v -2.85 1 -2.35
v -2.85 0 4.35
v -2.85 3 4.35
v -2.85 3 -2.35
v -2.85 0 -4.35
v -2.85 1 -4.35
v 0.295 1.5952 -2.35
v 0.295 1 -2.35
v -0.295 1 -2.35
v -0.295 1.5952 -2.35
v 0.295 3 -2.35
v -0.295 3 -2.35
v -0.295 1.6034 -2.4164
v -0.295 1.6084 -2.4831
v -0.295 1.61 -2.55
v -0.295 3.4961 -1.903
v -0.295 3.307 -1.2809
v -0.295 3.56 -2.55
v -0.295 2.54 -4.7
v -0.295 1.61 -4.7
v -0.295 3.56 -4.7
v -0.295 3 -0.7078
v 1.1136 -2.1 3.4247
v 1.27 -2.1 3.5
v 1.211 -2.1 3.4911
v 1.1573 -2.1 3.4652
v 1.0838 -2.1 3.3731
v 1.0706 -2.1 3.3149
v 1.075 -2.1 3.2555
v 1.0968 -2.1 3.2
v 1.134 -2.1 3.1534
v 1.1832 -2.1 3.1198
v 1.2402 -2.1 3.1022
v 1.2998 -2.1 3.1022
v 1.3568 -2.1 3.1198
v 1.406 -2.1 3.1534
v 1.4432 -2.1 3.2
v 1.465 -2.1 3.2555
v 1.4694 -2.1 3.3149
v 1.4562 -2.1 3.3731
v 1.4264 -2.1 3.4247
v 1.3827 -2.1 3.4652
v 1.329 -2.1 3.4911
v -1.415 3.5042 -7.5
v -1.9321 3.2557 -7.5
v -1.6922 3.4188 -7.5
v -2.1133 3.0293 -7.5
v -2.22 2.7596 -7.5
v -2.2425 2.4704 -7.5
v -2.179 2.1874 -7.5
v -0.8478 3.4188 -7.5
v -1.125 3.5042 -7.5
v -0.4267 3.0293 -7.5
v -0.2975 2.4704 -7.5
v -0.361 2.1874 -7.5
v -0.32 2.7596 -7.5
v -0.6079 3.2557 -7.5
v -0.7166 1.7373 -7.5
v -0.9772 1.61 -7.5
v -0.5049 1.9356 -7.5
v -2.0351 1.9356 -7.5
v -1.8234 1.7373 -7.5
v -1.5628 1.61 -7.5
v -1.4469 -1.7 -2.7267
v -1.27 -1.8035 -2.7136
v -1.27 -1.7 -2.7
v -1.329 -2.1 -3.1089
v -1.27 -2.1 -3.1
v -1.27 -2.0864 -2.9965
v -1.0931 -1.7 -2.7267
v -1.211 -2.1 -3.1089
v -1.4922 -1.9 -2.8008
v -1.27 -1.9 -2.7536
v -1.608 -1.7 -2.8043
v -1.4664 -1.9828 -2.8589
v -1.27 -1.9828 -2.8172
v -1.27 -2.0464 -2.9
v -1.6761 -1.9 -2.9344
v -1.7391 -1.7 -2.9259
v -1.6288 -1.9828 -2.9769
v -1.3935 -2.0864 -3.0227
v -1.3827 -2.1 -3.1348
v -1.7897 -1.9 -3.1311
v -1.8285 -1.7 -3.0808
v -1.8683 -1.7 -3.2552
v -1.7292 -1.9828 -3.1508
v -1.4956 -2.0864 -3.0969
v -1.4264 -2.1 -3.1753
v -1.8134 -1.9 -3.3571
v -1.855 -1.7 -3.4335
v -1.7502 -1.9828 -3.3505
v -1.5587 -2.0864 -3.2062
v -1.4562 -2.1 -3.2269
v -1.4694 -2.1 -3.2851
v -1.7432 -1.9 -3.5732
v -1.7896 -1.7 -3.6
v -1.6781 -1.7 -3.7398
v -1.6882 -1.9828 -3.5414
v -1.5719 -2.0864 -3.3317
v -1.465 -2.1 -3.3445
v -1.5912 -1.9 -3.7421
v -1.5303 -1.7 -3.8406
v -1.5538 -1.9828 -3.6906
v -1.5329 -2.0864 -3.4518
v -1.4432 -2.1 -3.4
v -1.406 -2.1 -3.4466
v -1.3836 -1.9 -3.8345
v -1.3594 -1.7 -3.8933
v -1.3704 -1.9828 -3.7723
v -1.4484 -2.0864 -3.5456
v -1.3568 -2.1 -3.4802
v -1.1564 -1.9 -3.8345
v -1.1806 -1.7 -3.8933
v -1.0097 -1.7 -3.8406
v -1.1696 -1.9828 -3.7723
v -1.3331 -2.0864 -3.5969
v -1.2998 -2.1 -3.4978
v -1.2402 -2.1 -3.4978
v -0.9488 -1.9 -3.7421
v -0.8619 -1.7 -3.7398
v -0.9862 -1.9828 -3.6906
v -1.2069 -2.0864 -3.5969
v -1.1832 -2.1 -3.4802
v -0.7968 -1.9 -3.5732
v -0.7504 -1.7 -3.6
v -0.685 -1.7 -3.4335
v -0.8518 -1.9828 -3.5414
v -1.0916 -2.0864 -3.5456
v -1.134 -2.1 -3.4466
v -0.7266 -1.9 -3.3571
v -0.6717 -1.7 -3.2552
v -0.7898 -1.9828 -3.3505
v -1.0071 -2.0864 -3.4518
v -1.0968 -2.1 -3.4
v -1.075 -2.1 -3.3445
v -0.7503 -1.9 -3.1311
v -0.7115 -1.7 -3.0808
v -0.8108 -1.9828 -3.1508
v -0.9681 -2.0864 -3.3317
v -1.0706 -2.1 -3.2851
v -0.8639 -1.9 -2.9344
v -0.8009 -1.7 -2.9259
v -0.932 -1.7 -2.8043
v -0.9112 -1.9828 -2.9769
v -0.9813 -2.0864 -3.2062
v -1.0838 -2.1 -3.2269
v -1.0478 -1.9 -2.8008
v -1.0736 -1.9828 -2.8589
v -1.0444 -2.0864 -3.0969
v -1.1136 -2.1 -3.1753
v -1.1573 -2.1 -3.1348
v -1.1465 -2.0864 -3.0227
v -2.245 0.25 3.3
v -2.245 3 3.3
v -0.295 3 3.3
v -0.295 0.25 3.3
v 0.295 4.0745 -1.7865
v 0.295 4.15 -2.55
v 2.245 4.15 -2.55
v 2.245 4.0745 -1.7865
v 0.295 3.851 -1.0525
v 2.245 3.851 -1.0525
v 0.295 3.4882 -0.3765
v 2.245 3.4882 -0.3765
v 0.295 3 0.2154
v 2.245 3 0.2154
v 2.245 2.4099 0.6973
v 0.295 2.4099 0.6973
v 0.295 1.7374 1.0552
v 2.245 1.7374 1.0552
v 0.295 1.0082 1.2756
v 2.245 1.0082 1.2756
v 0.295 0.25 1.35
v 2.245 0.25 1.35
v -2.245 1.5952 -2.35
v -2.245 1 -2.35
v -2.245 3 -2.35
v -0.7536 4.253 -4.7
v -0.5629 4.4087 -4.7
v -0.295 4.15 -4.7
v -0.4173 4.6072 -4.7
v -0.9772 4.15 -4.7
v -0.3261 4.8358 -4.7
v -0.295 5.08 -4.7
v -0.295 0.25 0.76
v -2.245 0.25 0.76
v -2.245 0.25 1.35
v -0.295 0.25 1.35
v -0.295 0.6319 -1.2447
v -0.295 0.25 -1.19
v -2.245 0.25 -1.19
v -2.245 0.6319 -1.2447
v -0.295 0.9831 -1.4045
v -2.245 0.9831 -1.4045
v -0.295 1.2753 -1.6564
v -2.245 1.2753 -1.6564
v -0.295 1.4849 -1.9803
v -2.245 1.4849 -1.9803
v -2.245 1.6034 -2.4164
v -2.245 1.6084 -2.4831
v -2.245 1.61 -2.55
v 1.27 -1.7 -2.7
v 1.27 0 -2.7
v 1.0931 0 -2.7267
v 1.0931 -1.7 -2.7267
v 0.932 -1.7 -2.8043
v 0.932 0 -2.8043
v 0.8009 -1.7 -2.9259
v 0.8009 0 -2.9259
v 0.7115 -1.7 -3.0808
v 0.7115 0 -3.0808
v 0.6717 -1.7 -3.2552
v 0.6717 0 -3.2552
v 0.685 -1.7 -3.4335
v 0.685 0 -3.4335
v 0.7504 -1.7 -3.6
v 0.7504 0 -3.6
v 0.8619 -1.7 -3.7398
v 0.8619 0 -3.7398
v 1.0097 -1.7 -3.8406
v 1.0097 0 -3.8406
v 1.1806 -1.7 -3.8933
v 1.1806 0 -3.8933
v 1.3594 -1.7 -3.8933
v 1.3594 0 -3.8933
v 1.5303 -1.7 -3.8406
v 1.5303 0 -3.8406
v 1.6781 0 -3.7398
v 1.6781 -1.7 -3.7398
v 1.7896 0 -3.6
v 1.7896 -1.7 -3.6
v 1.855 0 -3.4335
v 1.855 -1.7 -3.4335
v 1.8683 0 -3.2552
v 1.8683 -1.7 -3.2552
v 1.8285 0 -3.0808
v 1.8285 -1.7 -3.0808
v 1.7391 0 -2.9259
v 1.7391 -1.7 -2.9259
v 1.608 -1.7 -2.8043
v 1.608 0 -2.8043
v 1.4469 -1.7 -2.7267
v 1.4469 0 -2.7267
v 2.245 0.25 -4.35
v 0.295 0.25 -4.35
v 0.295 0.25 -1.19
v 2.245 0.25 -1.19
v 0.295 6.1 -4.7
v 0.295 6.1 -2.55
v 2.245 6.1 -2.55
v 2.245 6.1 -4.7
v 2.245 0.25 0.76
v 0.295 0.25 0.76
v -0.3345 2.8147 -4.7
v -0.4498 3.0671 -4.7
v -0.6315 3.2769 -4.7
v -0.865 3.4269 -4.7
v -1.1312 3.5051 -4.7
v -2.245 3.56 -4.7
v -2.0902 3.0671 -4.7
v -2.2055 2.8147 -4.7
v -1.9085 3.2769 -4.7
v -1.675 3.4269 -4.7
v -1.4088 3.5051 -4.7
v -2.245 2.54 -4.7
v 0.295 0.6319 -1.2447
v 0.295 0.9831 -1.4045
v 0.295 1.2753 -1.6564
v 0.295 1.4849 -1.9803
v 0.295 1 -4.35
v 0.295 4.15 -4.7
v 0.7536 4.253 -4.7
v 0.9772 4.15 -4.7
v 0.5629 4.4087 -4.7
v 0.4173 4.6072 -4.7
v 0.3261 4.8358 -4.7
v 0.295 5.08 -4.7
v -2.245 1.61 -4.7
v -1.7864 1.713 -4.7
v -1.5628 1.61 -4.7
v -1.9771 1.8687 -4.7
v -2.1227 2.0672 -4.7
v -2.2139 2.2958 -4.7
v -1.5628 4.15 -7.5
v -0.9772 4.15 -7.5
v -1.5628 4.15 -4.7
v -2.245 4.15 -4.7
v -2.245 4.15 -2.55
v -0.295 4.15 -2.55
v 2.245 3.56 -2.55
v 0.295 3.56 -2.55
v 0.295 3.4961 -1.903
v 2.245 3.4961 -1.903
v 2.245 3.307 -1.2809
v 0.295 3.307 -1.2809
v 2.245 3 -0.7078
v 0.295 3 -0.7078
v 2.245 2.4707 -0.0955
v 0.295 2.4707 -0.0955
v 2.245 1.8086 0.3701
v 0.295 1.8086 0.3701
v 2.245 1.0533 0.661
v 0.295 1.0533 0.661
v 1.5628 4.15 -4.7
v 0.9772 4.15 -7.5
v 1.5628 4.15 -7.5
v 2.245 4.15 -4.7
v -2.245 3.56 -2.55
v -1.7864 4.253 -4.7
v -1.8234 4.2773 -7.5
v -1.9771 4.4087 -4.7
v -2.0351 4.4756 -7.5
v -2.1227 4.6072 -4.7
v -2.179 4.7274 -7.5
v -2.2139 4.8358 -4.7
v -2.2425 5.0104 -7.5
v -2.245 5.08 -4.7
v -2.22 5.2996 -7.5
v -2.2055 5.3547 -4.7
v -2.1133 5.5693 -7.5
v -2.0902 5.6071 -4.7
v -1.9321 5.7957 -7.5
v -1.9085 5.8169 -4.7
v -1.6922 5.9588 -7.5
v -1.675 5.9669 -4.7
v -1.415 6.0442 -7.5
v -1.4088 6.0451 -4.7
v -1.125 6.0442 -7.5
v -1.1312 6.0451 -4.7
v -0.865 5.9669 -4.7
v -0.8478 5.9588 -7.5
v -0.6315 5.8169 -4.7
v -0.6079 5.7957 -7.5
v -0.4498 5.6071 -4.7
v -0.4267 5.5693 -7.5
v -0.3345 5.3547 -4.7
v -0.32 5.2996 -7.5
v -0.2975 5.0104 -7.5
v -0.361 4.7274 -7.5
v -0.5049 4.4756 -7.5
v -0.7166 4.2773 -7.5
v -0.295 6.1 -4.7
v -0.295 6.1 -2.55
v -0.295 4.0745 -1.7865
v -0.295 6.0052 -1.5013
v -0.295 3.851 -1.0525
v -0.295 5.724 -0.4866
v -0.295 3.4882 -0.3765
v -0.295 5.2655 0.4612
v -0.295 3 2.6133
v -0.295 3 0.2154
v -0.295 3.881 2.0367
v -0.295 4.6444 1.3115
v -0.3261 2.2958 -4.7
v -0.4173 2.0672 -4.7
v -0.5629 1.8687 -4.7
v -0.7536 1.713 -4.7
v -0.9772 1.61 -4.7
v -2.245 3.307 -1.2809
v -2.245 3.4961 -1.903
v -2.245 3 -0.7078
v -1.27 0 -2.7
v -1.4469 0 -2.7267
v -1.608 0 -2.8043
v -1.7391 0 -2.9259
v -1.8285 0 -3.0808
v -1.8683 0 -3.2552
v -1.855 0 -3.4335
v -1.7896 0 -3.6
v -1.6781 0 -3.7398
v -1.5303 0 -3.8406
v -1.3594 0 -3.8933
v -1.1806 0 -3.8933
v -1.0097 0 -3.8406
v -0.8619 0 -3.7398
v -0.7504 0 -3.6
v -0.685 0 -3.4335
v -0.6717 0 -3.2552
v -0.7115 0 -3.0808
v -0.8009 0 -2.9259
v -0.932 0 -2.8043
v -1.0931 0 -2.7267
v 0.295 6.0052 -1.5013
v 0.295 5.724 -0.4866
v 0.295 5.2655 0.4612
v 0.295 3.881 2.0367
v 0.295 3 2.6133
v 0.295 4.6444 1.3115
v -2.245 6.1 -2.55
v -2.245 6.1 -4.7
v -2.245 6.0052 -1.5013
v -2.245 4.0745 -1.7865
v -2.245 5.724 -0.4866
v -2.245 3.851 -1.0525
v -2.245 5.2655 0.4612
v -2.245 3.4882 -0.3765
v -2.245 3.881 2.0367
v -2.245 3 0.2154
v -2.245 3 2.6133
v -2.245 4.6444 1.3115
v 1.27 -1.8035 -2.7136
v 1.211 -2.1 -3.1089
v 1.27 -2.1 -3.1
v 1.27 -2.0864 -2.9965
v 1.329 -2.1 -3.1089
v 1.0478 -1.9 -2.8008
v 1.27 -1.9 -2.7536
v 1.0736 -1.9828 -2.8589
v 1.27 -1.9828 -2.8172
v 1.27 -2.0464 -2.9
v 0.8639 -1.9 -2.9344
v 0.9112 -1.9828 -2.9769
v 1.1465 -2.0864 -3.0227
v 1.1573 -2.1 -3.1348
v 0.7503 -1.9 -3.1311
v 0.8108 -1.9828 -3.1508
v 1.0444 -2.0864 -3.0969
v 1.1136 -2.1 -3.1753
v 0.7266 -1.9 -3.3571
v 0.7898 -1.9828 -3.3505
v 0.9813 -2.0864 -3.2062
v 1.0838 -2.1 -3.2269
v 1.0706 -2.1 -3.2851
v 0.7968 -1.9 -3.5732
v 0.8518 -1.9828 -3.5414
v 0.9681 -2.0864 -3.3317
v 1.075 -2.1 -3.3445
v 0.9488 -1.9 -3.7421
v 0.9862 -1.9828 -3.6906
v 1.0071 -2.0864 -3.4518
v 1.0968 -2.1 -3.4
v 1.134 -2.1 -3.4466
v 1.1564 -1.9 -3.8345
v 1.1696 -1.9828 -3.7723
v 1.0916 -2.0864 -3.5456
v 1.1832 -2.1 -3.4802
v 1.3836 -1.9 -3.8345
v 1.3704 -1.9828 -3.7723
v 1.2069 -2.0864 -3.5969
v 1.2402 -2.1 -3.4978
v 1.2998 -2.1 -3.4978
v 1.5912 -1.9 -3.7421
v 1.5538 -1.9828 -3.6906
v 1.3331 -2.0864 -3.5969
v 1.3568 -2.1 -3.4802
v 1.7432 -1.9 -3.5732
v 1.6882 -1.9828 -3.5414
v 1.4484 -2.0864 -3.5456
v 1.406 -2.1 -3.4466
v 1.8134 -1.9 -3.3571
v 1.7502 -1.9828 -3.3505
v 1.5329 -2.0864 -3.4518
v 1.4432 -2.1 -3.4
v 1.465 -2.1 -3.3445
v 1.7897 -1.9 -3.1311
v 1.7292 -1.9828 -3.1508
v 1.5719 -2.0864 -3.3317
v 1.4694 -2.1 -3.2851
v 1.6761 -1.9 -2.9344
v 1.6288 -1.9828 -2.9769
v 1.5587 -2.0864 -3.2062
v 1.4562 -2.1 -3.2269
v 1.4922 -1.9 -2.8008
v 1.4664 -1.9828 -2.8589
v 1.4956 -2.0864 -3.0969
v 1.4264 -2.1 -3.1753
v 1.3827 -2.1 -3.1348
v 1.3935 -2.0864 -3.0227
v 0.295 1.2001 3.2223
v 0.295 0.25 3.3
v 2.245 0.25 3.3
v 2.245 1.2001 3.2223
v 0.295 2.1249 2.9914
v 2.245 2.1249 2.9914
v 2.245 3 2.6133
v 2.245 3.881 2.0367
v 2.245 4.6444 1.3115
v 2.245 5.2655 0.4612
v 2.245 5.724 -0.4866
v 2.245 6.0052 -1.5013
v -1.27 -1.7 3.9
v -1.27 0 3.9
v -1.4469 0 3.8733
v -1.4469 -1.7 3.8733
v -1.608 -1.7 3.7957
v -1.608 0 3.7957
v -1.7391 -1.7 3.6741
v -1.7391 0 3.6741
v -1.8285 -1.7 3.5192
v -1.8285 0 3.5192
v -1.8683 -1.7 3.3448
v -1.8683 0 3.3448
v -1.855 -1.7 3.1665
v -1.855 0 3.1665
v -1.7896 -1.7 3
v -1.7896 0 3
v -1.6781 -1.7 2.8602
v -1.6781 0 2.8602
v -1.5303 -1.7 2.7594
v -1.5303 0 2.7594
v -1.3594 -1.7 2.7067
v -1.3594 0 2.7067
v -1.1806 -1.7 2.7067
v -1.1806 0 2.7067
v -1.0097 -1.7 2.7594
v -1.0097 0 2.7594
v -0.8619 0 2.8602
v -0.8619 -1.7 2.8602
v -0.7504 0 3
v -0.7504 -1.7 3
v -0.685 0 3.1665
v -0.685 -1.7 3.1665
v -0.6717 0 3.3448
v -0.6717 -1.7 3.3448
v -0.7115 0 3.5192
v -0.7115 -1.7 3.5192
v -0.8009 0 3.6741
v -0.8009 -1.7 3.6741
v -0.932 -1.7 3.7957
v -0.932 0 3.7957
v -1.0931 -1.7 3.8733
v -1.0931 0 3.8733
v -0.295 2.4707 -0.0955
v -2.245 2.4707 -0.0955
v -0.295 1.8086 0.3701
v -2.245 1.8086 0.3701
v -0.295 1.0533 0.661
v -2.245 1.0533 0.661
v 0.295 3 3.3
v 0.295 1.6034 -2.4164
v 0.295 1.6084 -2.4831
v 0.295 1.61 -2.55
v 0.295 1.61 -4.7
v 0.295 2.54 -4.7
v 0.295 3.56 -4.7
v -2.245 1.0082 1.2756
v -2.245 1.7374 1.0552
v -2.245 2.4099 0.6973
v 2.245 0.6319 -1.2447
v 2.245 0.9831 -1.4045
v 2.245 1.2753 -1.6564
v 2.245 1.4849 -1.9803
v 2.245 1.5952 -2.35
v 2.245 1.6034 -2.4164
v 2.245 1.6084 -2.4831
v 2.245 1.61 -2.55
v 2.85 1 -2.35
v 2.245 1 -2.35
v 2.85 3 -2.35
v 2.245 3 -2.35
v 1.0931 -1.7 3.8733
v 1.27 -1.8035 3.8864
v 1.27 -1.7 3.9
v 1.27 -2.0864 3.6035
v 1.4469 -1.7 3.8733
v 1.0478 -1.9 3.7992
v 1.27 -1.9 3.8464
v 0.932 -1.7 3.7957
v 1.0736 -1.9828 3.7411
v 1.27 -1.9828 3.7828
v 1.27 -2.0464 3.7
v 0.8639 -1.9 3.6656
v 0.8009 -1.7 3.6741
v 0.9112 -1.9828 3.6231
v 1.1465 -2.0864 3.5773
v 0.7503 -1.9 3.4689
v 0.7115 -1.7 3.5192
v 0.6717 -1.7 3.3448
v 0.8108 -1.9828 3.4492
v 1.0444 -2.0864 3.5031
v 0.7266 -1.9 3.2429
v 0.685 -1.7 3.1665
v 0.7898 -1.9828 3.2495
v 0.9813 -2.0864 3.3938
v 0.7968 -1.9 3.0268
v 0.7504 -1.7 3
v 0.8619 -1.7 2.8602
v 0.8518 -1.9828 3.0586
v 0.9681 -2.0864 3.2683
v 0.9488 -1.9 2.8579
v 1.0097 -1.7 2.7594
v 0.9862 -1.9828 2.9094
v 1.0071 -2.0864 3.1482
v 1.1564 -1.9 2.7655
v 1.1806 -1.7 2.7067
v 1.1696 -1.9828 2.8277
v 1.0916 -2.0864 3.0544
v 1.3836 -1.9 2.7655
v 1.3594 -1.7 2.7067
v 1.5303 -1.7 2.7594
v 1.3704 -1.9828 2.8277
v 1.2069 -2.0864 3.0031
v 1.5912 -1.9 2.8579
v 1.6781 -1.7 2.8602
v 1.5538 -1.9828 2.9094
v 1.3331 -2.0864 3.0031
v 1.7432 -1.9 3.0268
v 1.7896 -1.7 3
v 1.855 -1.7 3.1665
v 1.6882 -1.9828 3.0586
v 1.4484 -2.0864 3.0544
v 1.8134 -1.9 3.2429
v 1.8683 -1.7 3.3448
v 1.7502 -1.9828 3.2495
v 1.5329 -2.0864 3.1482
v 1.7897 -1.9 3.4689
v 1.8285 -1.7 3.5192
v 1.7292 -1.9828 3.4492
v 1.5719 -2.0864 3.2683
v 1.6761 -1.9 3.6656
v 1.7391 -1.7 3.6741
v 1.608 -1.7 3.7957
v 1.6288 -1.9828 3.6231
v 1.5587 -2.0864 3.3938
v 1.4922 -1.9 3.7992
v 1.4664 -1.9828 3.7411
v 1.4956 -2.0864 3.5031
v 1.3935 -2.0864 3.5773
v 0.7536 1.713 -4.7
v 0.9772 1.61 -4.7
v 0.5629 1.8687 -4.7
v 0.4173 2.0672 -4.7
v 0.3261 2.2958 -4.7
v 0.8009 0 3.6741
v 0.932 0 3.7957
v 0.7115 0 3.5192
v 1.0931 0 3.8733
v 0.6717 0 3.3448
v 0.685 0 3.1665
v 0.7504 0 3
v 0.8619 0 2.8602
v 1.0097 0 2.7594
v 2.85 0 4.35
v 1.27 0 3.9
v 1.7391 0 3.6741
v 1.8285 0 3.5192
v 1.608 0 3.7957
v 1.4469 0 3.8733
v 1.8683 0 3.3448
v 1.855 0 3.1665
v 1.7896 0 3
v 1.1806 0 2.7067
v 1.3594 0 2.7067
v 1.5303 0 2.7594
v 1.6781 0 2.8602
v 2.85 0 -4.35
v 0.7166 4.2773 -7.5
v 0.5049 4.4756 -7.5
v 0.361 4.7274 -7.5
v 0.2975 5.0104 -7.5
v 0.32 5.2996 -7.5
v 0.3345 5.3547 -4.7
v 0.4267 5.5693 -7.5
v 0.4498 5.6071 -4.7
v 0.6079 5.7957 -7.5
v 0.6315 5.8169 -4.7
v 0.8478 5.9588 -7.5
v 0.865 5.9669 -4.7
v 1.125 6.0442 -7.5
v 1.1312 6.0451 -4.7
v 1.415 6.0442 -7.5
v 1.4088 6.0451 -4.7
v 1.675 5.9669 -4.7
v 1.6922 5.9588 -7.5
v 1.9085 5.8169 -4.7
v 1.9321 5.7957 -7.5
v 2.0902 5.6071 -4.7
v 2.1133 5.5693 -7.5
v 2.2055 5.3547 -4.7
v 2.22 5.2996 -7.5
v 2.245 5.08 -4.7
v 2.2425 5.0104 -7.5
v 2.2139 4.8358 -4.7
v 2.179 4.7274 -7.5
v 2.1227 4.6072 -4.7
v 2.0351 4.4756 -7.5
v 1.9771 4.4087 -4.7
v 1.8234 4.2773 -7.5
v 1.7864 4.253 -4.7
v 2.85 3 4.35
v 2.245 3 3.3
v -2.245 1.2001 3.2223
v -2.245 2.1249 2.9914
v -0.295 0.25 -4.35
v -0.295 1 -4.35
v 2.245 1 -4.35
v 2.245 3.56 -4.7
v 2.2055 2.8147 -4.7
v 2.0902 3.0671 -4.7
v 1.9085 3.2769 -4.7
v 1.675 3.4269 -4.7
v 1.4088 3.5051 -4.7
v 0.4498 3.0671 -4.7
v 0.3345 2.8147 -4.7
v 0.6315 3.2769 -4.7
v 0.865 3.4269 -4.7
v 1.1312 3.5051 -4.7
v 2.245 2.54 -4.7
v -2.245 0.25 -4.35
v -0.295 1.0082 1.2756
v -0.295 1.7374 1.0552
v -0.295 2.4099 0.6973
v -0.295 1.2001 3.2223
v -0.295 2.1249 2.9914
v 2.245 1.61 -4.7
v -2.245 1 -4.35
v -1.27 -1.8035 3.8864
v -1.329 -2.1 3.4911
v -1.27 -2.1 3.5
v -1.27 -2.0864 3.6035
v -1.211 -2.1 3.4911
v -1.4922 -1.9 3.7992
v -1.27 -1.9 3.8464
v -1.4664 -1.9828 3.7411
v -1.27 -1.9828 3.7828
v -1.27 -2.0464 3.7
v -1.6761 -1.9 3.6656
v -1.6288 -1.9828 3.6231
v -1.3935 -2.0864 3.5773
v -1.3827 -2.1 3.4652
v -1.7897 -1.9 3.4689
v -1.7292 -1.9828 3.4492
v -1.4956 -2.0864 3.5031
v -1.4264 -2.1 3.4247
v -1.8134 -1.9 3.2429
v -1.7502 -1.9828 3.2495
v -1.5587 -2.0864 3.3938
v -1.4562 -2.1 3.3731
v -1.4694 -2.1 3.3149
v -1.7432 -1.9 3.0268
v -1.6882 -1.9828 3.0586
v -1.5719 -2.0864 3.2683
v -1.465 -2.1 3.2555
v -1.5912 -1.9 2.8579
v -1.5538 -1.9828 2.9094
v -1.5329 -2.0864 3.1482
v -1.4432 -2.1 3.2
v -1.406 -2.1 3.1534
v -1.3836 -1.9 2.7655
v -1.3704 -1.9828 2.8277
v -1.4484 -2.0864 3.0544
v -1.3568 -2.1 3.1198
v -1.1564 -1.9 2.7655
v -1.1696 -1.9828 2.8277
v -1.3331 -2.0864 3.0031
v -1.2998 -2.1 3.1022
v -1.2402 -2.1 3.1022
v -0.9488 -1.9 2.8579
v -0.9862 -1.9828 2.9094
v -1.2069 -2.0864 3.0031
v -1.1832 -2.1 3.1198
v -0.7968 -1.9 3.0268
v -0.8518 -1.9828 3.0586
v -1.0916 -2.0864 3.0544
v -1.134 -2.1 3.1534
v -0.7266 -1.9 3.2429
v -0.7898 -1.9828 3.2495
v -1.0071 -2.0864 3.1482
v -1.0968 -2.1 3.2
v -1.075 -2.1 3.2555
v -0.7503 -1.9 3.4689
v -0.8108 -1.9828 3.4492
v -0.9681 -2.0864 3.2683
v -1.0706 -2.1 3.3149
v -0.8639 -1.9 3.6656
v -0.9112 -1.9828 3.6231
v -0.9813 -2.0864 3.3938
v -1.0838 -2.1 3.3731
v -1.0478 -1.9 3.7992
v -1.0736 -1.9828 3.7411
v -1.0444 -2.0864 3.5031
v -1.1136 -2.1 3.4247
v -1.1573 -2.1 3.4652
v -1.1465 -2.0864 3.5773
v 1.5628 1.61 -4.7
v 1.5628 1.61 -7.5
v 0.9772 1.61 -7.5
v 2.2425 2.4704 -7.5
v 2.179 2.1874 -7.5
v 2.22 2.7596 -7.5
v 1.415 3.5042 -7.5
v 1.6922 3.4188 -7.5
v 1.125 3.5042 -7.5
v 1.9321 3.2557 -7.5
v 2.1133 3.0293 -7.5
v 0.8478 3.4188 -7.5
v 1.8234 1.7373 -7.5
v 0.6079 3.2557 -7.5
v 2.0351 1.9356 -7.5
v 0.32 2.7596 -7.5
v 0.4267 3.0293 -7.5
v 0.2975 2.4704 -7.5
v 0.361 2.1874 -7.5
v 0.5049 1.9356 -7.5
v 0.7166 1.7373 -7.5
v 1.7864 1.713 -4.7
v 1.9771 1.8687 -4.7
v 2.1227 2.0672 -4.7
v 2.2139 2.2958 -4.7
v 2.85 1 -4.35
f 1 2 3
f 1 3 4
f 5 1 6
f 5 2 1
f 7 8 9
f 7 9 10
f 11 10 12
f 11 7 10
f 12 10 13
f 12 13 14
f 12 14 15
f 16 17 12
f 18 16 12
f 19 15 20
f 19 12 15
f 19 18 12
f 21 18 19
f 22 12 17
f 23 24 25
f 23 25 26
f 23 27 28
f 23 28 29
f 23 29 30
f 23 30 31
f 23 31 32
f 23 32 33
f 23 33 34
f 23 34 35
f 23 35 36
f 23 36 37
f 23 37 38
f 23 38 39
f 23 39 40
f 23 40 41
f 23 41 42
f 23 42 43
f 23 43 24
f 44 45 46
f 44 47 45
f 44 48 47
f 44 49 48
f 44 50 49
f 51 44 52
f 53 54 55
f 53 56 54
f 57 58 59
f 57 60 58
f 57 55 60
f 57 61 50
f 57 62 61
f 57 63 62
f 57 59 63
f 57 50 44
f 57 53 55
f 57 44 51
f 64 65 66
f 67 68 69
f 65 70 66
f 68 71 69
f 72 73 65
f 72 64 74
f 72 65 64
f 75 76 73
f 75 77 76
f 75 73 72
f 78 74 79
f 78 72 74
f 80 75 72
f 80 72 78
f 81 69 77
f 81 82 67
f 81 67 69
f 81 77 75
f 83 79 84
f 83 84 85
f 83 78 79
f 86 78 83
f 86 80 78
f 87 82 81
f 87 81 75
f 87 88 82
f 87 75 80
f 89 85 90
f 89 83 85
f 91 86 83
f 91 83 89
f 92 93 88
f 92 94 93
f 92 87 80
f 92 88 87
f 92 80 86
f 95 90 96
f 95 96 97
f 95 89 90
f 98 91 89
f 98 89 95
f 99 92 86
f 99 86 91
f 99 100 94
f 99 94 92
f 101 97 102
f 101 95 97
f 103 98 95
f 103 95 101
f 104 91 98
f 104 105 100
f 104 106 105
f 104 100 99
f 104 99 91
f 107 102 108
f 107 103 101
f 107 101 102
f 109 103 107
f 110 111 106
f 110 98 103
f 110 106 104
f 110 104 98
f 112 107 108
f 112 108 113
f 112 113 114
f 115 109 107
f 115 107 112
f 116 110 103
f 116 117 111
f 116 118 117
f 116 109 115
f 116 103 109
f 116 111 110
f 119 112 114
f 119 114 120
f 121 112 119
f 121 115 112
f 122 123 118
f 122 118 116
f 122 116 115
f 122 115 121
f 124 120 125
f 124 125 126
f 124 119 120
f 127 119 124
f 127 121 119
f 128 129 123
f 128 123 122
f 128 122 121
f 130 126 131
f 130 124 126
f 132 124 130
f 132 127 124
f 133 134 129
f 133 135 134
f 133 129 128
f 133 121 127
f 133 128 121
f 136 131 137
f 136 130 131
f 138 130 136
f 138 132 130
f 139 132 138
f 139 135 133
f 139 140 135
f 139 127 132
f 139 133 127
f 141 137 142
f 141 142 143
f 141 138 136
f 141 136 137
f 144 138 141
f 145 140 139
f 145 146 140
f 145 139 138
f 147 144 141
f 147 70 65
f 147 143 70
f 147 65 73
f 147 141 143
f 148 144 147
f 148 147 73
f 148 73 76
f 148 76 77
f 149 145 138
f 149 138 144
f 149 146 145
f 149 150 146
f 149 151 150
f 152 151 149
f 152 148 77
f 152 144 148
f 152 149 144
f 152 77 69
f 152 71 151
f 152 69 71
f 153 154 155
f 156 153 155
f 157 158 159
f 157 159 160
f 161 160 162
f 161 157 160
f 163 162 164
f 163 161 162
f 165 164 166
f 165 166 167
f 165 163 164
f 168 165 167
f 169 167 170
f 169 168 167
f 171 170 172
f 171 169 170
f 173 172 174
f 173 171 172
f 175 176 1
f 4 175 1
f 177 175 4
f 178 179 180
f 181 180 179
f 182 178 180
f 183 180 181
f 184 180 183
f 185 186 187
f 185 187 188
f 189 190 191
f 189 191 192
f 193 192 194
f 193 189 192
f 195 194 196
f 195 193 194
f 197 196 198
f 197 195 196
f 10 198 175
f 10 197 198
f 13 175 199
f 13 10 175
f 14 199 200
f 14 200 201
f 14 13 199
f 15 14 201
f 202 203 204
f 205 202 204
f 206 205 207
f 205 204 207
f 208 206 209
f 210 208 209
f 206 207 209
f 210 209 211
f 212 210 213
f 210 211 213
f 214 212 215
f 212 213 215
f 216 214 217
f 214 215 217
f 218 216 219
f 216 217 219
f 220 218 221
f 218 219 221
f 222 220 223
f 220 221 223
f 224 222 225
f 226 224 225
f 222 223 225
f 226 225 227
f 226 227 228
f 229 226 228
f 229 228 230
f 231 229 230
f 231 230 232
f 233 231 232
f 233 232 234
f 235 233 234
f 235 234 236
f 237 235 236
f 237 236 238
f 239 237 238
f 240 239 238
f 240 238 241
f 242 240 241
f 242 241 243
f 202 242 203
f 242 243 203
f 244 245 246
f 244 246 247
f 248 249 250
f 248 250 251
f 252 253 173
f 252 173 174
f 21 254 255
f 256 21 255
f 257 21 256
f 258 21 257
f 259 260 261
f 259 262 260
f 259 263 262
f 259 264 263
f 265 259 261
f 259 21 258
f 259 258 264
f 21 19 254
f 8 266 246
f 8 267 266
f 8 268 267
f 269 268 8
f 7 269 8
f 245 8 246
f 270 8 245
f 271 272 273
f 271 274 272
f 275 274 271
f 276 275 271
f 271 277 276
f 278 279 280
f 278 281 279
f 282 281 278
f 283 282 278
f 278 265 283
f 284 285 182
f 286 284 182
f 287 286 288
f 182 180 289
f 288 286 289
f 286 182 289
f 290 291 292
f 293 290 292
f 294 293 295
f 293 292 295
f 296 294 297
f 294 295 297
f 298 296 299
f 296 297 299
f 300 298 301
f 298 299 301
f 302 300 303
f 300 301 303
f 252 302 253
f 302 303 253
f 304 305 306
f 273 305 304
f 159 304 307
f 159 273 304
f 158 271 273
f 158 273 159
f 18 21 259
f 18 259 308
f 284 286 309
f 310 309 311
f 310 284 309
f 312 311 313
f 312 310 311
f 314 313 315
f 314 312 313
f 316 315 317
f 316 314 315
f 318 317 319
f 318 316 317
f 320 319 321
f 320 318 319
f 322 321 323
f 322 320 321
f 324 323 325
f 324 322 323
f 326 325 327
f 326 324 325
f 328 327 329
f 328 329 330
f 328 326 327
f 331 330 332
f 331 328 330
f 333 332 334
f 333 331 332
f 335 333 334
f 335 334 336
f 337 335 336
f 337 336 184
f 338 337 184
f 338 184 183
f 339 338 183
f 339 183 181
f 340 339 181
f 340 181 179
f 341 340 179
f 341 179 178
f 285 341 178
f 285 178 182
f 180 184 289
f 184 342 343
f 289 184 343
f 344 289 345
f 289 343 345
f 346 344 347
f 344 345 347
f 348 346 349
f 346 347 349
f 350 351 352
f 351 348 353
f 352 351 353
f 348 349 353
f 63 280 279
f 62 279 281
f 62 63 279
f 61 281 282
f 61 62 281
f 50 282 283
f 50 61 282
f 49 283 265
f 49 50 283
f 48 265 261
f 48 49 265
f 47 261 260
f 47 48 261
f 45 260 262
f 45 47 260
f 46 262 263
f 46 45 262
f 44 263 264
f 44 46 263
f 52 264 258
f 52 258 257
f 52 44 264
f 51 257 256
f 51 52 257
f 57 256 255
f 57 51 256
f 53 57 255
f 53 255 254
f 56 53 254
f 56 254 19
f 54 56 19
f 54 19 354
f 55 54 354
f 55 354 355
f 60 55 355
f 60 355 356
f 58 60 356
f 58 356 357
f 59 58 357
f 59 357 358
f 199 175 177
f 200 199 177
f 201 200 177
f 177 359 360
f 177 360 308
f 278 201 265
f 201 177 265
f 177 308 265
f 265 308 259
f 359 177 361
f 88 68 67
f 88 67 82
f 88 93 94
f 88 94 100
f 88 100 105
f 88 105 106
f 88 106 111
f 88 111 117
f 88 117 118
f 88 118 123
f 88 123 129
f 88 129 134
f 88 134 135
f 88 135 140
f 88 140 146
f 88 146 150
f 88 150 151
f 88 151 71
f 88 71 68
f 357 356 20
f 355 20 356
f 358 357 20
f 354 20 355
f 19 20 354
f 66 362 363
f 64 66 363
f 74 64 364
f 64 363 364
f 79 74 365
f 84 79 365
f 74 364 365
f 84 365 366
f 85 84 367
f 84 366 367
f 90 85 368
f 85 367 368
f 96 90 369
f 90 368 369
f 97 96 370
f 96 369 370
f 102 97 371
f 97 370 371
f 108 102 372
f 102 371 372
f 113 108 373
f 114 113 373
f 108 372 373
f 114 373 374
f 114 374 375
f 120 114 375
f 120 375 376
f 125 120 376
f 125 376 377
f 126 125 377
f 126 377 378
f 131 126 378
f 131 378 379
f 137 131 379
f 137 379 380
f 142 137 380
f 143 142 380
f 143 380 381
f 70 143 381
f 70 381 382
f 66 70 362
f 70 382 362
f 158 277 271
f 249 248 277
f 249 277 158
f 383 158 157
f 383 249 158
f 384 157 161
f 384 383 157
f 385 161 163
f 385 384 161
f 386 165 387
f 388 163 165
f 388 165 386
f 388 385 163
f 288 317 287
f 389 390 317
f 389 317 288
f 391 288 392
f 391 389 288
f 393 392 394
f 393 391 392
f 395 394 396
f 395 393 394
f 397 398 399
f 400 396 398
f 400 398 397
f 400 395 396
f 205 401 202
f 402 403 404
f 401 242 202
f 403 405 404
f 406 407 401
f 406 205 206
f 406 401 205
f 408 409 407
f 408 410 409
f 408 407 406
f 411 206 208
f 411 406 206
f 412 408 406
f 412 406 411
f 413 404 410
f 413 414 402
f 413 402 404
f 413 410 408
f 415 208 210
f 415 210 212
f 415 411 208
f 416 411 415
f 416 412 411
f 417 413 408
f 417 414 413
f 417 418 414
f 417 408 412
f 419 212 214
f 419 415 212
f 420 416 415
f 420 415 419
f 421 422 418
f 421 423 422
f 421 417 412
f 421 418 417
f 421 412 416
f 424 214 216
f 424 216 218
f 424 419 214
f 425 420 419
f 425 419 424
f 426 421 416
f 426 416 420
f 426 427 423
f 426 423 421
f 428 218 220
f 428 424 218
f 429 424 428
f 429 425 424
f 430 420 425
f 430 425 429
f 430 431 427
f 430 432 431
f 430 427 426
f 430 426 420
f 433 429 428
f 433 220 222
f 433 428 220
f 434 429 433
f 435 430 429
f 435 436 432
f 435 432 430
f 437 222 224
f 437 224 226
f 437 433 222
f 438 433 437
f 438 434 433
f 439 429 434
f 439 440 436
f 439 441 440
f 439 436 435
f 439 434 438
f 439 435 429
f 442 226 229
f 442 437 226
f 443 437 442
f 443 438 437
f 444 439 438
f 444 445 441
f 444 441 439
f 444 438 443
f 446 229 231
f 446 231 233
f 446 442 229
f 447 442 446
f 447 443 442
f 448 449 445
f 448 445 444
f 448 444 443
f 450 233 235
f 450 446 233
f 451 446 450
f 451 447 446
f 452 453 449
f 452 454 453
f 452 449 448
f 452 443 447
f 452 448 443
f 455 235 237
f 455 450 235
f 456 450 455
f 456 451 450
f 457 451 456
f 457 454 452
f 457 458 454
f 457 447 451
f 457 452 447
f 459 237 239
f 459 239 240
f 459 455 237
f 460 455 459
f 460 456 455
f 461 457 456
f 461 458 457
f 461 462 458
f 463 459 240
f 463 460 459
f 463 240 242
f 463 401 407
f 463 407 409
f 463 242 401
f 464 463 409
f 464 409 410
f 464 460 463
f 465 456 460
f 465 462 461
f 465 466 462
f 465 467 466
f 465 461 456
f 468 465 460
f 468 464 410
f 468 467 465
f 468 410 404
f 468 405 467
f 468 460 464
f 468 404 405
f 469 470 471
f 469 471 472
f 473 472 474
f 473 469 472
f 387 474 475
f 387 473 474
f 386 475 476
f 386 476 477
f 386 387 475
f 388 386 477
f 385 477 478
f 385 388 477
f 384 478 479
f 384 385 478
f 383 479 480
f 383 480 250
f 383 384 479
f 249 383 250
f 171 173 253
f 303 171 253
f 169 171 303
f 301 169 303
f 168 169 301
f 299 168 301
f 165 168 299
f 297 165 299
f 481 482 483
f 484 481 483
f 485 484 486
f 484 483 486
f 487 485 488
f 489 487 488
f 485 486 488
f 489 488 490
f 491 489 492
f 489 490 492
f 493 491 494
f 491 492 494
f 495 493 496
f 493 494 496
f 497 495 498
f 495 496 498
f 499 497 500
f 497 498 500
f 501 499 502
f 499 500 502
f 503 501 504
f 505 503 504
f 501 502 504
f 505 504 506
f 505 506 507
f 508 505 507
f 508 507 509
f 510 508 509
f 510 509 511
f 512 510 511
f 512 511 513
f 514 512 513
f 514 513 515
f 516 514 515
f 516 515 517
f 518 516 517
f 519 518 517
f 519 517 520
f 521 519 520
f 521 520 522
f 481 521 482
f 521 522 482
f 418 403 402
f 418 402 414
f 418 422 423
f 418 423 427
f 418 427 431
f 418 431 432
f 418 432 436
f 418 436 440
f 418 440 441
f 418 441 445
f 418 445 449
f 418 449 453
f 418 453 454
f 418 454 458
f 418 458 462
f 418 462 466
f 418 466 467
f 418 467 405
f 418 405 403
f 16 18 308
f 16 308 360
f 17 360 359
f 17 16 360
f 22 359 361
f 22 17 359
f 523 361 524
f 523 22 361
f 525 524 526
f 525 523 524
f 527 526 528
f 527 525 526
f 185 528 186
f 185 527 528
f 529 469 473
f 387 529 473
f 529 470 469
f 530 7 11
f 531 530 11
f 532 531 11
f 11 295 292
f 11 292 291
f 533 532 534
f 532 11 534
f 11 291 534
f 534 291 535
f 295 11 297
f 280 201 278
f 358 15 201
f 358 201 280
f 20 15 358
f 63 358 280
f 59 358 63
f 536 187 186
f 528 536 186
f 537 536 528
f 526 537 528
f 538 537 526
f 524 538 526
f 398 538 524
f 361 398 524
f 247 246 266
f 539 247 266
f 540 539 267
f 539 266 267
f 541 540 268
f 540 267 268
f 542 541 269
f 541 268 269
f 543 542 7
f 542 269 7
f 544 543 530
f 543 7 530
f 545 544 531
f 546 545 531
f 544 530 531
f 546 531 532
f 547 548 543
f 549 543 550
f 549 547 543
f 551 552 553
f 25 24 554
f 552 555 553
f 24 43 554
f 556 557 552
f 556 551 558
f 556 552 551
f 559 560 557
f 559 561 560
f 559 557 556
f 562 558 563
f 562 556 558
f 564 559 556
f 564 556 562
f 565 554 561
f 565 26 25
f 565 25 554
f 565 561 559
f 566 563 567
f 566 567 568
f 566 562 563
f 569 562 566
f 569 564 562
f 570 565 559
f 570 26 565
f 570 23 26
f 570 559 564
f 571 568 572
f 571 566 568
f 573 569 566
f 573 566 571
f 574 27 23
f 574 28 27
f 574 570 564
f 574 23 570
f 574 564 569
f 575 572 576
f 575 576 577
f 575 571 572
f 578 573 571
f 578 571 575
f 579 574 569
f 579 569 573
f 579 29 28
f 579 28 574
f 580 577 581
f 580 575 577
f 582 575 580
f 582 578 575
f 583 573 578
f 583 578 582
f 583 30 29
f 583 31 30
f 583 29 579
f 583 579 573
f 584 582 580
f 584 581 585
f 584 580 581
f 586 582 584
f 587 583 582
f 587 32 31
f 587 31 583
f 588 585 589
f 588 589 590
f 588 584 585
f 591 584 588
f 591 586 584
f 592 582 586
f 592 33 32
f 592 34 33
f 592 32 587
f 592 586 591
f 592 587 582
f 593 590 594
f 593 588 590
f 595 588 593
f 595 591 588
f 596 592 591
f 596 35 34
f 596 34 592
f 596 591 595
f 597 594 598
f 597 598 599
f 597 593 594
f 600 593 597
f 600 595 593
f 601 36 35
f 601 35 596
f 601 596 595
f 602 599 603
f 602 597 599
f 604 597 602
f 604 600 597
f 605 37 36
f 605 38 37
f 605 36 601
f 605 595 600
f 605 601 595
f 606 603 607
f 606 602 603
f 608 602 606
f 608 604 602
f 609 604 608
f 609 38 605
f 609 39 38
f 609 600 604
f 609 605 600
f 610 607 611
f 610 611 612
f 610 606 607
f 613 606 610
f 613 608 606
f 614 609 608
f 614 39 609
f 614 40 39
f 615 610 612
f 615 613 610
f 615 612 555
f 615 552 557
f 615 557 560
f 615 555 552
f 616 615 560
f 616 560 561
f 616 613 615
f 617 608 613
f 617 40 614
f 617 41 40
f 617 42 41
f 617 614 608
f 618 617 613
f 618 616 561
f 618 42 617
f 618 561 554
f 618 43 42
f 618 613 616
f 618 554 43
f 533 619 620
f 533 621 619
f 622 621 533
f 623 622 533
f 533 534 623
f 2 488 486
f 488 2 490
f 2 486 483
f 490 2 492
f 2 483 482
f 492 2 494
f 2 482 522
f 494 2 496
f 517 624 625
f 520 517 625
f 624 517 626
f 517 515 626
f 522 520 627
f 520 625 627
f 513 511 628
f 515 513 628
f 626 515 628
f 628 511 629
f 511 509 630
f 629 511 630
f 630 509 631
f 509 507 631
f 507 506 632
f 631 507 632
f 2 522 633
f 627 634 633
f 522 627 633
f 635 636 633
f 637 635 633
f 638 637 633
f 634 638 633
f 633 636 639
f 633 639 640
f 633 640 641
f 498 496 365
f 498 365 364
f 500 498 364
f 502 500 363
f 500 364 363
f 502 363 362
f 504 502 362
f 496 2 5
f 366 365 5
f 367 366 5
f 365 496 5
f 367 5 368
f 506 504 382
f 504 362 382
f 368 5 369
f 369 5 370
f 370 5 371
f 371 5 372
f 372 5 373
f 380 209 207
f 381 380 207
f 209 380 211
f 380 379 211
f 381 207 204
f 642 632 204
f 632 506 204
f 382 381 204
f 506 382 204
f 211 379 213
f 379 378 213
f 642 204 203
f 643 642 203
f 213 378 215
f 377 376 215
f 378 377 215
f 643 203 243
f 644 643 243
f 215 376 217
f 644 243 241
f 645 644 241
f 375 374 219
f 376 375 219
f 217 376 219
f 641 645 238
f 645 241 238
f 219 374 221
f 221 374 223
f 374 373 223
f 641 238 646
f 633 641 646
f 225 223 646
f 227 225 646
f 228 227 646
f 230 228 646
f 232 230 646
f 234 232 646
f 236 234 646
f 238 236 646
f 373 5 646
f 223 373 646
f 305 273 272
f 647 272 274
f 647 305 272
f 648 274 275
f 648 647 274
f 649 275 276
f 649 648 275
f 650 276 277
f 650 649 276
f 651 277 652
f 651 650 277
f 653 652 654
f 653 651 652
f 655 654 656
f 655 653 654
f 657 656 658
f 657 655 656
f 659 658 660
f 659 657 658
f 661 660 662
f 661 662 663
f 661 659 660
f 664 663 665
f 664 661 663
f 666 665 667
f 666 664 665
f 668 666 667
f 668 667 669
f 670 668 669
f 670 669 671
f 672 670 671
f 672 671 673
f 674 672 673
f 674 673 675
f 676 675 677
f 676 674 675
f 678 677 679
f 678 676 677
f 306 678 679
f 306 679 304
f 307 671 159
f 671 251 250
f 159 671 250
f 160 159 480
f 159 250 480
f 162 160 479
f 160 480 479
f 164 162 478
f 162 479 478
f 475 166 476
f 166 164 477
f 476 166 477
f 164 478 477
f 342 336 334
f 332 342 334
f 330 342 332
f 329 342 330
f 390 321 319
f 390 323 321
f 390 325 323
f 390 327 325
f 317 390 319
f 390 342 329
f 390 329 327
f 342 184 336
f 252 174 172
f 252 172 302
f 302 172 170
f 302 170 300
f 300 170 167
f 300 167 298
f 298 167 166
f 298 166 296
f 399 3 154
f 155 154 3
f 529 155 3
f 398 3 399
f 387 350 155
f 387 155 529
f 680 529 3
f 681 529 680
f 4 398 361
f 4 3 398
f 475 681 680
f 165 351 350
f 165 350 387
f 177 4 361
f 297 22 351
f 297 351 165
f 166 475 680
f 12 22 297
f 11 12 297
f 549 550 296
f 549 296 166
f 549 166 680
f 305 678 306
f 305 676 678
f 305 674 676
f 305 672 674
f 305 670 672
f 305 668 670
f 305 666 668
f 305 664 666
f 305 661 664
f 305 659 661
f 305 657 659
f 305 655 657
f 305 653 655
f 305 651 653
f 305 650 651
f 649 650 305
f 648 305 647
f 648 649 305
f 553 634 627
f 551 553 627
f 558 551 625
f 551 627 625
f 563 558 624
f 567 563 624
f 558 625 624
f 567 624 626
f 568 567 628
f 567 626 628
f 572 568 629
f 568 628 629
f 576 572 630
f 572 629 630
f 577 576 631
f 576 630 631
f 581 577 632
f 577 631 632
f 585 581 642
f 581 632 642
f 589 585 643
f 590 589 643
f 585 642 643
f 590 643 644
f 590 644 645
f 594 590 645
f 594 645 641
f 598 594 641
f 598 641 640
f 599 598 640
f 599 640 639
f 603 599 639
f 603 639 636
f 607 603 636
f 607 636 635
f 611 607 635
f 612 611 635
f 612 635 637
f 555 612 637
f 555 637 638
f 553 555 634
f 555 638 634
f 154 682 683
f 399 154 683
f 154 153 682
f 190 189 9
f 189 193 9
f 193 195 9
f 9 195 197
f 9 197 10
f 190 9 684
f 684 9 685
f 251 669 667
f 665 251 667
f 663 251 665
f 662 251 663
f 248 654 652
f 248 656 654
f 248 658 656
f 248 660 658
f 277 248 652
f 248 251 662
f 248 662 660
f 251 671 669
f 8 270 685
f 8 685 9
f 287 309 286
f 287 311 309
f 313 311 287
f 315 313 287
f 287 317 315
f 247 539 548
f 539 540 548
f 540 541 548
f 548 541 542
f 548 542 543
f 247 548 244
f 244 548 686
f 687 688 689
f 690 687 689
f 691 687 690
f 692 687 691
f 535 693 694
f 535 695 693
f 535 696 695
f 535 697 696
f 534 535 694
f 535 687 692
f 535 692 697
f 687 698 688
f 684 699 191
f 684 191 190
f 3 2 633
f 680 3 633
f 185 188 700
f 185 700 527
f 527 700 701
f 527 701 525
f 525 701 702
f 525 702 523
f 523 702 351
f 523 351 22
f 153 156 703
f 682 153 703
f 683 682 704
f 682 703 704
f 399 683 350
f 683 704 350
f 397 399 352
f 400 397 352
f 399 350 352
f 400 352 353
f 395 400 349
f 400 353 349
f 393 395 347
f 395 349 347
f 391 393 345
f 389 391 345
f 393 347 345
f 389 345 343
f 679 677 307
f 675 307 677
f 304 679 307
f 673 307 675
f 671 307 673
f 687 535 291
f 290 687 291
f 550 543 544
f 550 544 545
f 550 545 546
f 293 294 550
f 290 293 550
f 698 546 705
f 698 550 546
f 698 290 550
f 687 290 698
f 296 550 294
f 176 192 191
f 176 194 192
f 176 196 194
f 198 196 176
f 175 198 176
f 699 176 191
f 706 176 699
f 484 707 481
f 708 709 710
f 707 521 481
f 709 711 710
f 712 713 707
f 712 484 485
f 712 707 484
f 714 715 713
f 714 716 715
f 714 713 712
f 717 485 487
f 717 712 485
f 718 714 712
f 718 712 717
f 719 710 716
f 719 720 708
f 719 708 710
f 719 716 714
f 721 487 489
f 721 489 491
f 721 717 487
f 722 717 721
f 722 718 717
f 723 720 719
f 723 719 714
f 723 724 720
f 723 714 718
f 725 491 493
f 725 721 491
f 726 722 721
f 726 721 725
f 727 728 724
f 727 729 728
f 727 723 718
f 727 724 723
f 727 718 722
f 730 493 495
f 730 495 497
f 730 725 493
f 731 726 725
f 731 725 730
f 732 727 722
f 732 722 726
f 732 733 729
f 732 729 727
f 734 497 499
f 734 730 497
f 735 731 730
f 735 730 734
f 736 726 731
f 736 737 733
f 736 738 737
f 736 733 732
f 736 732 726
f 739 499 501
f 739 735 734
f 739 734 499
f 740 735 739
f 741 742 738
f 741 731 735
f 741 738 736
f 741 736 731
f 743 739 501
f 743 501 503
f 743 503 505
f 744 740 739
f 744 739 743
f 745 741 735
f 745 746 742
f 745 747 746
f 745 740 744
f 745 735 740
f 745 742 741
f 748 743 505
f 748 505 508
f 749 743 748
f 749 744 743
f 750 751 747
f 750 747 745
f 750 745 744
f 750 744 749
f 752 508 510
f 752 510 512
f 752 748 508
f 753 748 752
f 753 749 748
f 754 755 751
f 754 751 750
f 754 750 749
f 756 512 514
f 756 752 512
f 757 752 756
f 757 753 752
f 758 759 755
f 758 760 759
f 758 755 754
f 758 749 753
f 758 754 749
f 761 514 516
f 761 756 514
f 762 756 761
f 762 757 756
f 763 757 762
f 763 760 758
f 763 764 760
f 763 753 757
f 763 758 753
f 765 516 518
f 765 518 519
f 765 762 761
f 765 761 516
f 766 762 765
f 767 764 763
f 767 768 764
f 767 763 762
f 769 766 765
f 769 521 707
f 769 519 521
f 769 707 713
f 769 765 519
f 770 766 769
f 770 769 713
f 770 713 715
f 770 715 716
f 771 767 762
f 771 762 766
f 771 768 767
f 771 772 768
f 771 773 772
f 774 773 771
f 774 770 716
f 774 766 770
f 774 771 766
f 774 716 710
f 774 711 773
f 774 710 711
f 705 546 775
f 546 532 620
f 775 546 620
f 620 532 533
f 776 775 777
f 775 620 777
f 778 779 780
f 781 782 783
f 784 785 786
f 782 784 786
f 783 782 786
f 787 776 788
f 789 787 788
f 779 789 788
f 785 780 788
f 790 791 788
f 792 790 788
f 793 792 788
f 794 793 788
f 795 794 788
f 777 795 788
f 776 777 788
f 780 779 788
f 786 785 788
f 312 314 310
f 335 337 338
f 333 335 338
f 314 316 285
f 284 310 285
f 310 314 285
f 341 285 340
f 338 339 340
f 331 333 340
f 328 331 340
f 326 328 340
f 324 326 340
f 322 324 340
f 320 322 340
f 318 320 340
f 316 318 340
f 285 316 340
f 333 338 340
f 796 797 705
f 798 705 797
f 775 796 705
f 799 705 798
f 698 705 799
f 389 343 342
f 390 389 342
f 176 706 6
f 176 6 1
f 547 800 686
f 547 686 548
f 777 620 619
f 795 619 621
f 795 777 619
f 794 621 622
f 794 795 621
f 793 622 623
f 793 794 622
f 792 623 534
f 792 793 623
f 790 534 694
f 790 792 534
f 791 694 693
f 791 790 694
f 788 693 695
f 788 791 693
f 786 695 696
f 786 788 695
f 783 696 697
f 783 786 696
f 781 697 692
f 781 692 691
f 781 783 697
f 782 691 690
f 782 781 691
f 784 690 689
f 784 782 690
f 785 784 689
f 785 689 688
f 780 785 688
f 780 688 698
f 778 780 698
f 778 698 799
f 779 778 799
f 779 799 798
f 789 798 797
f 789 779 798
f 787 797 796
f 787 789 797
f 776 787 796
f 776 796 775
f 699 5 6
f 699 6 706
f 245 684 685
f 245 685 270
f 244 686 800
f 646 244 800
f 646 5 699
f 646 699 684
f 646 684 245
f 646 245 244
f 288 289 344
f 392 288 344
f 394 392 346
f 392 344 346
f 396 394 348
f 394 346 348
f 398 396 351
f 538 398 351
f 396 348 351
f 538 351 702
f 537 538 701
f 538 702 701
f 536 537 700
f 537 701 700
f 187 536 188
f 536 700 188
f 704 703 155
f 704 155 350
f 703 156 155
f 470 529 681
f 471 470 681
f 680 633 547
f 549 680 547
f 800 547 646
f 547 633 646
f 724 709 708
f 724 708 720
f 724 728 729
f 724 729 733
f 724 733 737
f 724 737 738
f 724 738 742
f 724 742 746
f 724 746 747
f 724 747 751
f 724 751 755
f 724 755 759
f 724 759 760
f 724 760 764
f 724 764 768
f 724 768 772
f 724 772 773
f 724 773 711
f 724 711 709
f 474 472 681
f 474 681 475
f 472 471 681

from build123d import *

# Parameters (mm, degrees)
SZKIC1_W                    = 5.7
SZKIC1_H                    = 8.7
DODANIE_WYCI_GNI_CIE1_DEPTH = 3
SZKIC5_W                    = 1.95
SZKIC5_H                    = 7.65
WYTNIJ_WYCI_GNI_CIE2_DEPTH  = 2.75
SZKIC3_W                    = 2
SZKIC3_H                    = 2
WYTNIJ_WYCI_GNI_CIE1_DEPTH  = 9.802840451
SZKIC6_R                    = 0.6
DODANIE_WYCI_GNI_CIE2_DEPTH = 2.1
ZAOKR_GLENIE1_R             = 0.4
DODANIE_WYCI_GNI_CIE3_DEPTH = 1.95
DODANIE_WYCI_GNI_CIE4_DEPTH = 1.95
SZKIC9_OUTSIDE_W            = 10.8
SZKIC9_OUTSIDE_H            = 13.3
SZKIC9_OUTSIDE_R            = 0.975
WYTNIJ_WYCI_GNI_CIE4_DEPTH  = 2.8


with BuildPart() as part:
    # Szkic1 → Dodanie-wyciągnięcie1 (new body)
    with BuildSketch(Plane(origin=(0, 0, 0), x_dir=(1, 0, 0), z_dir=(0, 1, 0))):
        Rectangle(SZKIC1_W, SZKIC1_H)
    extrude(amount=DODANIE_WYCI_GNI_CIE1_DEPTH)

    # Szkic5 → Wytnij-wyciągnięcie2 (cut)
    with BuildSketch(Plane(origin=(0, 3, 0), x_dir=(1, 0, 0), z_dir=(0, 1, 0))):
        with Locations((1.27, 0.525)):
            Rectangle(SZKIC5_W, SZKIC5_H)
        with Locations((-1.27, 0.525)):
            Rectangle(SZKIC5_W, SZKIC5_H)
    extrude(amount=-WYTNIJ_WYCI_GNI_CIE2_DEPTH, mode=Mode.SUBTRACT)

    # Szkic3 → Wytnij-wyciągnięcie1 (cut, through all)
    with BuildSketch(Plane(origin=(2.85, 0, 1.65), x_dir=(0, 0, 1), z_dir=(-1, 0, 0))):
        with Locations((-5, 2)):
            Rectangle(SZKIC3_W, SZKIC3_H)
    extrude(amount=WYTNIJ_WYCI_GNI_CIE1_DEPTH, mode=Mode.SUBTRACT)

    # Szkic6 → Dodanie-wyciągnięcie2 (add)
    with BuildSketch(Plane.XZ):
        with Locations(Location((1.27, 3.3, 0), (0, 0, 90))):
            Circle(SZKIC6_R)
        with Locations(Location((-1.27, 3.3, 0), (0, 0, 90))):
            Circle(SZKIC6_R)
        with Locations(Location((1.27, -3.3, 0), (0, 0, 90))):
            Circle(SZKIC6_R)
        with Locations(Location((-1.27, -3.3, 0), (0, 0, 90))):
            Circle(SZKIC6_R)
    extrude(amount=DODANIE_WYCI_GNI_CIE2_DEPTH)

    # Zaokrąglenie1
    zaokr_glenie1_edges = [part.edges().sort_by_distance(p)[0] for p in [
        (1.27, -2.1, 2.7),
        (-1.27, -2.1, 2.7),
        (1.27, -2.1, -3.9),
        (-1.27, -2.1, -3.9),
    ]]
    fillet(zaokr_glenie1_edges, radius=ZAOKR_GLENIE1_R)

    # Szkic7 → Dodanie-wyciągnięcie3 (add)
    with BuildSketch(Plane(origin=(0.295, 0, 0), x_dir=(0, 0, -1), z_dir=(1, 0, 0))):
        with BuildLine():
            Line((2.55, 6.1), (7.5, 6.1))
            Line((7.5, 6.1), (7.5, 4.15))
            Line((7.5, 4.15), (2.55, 4.15))
            ThreePointArc((2.55, 4.15), (-0.207716447, 3.007716447), (-1.35, 0.25))
            Line((-1.35, 0.25), (-3.3, 0.25))
            ThreePointArc((-3.3, 0.25), (-1.58657467, 4.38657467), (2.55, 6.1))
        make_face()
    dodanie_wyci_gni_cie3 = extrude(amount=DODANIE_WYCI_GNI_CIE3_DEPTH)

    # Szkic8 → Dodanie-wyciągnięcie4 (add)
    with BuildSketch(Plane(origin=(0.295, 0, 0), x_dir=(0, 0, -1), z_dir=(1, 0, 0))):
        with BuildLine():
            Line((7.5, 3.56), (2.55, 3.56))
            ThreePointArc((2.55, 3.56), (0.209476554, 2.590523446), (-0.76, 0.25))
            Line((-0.76, 0.25), (1.19, 0.25))
            ThreePointArc((1.19, 0.25), (1.588334778, 1.211665222), (2.55, 1.61))
            Line((2.55, 1.61), (7.5, 1.61))
            Line((7.5, 1.61), (7.5, 3.56))
        make_face()
    dodanie_wyci_gni_cie4 = extrude(amount=DODANIE_WYCI_GNI_CIE4_DEPTH)

    # Lustro2: Dodanie-wyciągnięcie3, Dodanie-wyciągnięcie4 across plane
    add(dodanie_wyci_gni_cie3.mirror(Plane.ZY))
    add(dodanie_wyci_gni_cie4.mirror(Plane.ZY))

    # Szkic9 outside → Wytnij-wyciągnięcie4 (cut)
    with BuildSketch(Plane(origin=(0, 0, -7.5), x_dir=(-1, 0, 0), z_dir=(0, 0, -1))):
        with Locations((0, 2)):
            Rectangle(SZKIC9_OUTSIDE_W, SZKIC9_OUTSIDE_H)
        with Locations((-1.27, 2.54)):
            Circle(SZKIC9_OUTSIDE_R, mode=Mode.SUBTRACT)
        with Locations((-1.27, 5.08)):
            Circle(SZKIC9_OUTSIDE_R, mode=Mode.SUBTRACT)
        with Locations((1.27, 5.08)):
            Circle(SZKIC9_OUTSIDE_R, mode=Mode.SUBTRACT)
        with Locations((1.27, 2.54)):
            Circle(SZKIC9_OUTSIDE_R, mode=Mode.SUBTRACT)
    extrude(amount=-WYTNIJ_WYCI_GNI_CIE4_DEPTH, mode=Mode.SUBTRACT)


solid = part.part
